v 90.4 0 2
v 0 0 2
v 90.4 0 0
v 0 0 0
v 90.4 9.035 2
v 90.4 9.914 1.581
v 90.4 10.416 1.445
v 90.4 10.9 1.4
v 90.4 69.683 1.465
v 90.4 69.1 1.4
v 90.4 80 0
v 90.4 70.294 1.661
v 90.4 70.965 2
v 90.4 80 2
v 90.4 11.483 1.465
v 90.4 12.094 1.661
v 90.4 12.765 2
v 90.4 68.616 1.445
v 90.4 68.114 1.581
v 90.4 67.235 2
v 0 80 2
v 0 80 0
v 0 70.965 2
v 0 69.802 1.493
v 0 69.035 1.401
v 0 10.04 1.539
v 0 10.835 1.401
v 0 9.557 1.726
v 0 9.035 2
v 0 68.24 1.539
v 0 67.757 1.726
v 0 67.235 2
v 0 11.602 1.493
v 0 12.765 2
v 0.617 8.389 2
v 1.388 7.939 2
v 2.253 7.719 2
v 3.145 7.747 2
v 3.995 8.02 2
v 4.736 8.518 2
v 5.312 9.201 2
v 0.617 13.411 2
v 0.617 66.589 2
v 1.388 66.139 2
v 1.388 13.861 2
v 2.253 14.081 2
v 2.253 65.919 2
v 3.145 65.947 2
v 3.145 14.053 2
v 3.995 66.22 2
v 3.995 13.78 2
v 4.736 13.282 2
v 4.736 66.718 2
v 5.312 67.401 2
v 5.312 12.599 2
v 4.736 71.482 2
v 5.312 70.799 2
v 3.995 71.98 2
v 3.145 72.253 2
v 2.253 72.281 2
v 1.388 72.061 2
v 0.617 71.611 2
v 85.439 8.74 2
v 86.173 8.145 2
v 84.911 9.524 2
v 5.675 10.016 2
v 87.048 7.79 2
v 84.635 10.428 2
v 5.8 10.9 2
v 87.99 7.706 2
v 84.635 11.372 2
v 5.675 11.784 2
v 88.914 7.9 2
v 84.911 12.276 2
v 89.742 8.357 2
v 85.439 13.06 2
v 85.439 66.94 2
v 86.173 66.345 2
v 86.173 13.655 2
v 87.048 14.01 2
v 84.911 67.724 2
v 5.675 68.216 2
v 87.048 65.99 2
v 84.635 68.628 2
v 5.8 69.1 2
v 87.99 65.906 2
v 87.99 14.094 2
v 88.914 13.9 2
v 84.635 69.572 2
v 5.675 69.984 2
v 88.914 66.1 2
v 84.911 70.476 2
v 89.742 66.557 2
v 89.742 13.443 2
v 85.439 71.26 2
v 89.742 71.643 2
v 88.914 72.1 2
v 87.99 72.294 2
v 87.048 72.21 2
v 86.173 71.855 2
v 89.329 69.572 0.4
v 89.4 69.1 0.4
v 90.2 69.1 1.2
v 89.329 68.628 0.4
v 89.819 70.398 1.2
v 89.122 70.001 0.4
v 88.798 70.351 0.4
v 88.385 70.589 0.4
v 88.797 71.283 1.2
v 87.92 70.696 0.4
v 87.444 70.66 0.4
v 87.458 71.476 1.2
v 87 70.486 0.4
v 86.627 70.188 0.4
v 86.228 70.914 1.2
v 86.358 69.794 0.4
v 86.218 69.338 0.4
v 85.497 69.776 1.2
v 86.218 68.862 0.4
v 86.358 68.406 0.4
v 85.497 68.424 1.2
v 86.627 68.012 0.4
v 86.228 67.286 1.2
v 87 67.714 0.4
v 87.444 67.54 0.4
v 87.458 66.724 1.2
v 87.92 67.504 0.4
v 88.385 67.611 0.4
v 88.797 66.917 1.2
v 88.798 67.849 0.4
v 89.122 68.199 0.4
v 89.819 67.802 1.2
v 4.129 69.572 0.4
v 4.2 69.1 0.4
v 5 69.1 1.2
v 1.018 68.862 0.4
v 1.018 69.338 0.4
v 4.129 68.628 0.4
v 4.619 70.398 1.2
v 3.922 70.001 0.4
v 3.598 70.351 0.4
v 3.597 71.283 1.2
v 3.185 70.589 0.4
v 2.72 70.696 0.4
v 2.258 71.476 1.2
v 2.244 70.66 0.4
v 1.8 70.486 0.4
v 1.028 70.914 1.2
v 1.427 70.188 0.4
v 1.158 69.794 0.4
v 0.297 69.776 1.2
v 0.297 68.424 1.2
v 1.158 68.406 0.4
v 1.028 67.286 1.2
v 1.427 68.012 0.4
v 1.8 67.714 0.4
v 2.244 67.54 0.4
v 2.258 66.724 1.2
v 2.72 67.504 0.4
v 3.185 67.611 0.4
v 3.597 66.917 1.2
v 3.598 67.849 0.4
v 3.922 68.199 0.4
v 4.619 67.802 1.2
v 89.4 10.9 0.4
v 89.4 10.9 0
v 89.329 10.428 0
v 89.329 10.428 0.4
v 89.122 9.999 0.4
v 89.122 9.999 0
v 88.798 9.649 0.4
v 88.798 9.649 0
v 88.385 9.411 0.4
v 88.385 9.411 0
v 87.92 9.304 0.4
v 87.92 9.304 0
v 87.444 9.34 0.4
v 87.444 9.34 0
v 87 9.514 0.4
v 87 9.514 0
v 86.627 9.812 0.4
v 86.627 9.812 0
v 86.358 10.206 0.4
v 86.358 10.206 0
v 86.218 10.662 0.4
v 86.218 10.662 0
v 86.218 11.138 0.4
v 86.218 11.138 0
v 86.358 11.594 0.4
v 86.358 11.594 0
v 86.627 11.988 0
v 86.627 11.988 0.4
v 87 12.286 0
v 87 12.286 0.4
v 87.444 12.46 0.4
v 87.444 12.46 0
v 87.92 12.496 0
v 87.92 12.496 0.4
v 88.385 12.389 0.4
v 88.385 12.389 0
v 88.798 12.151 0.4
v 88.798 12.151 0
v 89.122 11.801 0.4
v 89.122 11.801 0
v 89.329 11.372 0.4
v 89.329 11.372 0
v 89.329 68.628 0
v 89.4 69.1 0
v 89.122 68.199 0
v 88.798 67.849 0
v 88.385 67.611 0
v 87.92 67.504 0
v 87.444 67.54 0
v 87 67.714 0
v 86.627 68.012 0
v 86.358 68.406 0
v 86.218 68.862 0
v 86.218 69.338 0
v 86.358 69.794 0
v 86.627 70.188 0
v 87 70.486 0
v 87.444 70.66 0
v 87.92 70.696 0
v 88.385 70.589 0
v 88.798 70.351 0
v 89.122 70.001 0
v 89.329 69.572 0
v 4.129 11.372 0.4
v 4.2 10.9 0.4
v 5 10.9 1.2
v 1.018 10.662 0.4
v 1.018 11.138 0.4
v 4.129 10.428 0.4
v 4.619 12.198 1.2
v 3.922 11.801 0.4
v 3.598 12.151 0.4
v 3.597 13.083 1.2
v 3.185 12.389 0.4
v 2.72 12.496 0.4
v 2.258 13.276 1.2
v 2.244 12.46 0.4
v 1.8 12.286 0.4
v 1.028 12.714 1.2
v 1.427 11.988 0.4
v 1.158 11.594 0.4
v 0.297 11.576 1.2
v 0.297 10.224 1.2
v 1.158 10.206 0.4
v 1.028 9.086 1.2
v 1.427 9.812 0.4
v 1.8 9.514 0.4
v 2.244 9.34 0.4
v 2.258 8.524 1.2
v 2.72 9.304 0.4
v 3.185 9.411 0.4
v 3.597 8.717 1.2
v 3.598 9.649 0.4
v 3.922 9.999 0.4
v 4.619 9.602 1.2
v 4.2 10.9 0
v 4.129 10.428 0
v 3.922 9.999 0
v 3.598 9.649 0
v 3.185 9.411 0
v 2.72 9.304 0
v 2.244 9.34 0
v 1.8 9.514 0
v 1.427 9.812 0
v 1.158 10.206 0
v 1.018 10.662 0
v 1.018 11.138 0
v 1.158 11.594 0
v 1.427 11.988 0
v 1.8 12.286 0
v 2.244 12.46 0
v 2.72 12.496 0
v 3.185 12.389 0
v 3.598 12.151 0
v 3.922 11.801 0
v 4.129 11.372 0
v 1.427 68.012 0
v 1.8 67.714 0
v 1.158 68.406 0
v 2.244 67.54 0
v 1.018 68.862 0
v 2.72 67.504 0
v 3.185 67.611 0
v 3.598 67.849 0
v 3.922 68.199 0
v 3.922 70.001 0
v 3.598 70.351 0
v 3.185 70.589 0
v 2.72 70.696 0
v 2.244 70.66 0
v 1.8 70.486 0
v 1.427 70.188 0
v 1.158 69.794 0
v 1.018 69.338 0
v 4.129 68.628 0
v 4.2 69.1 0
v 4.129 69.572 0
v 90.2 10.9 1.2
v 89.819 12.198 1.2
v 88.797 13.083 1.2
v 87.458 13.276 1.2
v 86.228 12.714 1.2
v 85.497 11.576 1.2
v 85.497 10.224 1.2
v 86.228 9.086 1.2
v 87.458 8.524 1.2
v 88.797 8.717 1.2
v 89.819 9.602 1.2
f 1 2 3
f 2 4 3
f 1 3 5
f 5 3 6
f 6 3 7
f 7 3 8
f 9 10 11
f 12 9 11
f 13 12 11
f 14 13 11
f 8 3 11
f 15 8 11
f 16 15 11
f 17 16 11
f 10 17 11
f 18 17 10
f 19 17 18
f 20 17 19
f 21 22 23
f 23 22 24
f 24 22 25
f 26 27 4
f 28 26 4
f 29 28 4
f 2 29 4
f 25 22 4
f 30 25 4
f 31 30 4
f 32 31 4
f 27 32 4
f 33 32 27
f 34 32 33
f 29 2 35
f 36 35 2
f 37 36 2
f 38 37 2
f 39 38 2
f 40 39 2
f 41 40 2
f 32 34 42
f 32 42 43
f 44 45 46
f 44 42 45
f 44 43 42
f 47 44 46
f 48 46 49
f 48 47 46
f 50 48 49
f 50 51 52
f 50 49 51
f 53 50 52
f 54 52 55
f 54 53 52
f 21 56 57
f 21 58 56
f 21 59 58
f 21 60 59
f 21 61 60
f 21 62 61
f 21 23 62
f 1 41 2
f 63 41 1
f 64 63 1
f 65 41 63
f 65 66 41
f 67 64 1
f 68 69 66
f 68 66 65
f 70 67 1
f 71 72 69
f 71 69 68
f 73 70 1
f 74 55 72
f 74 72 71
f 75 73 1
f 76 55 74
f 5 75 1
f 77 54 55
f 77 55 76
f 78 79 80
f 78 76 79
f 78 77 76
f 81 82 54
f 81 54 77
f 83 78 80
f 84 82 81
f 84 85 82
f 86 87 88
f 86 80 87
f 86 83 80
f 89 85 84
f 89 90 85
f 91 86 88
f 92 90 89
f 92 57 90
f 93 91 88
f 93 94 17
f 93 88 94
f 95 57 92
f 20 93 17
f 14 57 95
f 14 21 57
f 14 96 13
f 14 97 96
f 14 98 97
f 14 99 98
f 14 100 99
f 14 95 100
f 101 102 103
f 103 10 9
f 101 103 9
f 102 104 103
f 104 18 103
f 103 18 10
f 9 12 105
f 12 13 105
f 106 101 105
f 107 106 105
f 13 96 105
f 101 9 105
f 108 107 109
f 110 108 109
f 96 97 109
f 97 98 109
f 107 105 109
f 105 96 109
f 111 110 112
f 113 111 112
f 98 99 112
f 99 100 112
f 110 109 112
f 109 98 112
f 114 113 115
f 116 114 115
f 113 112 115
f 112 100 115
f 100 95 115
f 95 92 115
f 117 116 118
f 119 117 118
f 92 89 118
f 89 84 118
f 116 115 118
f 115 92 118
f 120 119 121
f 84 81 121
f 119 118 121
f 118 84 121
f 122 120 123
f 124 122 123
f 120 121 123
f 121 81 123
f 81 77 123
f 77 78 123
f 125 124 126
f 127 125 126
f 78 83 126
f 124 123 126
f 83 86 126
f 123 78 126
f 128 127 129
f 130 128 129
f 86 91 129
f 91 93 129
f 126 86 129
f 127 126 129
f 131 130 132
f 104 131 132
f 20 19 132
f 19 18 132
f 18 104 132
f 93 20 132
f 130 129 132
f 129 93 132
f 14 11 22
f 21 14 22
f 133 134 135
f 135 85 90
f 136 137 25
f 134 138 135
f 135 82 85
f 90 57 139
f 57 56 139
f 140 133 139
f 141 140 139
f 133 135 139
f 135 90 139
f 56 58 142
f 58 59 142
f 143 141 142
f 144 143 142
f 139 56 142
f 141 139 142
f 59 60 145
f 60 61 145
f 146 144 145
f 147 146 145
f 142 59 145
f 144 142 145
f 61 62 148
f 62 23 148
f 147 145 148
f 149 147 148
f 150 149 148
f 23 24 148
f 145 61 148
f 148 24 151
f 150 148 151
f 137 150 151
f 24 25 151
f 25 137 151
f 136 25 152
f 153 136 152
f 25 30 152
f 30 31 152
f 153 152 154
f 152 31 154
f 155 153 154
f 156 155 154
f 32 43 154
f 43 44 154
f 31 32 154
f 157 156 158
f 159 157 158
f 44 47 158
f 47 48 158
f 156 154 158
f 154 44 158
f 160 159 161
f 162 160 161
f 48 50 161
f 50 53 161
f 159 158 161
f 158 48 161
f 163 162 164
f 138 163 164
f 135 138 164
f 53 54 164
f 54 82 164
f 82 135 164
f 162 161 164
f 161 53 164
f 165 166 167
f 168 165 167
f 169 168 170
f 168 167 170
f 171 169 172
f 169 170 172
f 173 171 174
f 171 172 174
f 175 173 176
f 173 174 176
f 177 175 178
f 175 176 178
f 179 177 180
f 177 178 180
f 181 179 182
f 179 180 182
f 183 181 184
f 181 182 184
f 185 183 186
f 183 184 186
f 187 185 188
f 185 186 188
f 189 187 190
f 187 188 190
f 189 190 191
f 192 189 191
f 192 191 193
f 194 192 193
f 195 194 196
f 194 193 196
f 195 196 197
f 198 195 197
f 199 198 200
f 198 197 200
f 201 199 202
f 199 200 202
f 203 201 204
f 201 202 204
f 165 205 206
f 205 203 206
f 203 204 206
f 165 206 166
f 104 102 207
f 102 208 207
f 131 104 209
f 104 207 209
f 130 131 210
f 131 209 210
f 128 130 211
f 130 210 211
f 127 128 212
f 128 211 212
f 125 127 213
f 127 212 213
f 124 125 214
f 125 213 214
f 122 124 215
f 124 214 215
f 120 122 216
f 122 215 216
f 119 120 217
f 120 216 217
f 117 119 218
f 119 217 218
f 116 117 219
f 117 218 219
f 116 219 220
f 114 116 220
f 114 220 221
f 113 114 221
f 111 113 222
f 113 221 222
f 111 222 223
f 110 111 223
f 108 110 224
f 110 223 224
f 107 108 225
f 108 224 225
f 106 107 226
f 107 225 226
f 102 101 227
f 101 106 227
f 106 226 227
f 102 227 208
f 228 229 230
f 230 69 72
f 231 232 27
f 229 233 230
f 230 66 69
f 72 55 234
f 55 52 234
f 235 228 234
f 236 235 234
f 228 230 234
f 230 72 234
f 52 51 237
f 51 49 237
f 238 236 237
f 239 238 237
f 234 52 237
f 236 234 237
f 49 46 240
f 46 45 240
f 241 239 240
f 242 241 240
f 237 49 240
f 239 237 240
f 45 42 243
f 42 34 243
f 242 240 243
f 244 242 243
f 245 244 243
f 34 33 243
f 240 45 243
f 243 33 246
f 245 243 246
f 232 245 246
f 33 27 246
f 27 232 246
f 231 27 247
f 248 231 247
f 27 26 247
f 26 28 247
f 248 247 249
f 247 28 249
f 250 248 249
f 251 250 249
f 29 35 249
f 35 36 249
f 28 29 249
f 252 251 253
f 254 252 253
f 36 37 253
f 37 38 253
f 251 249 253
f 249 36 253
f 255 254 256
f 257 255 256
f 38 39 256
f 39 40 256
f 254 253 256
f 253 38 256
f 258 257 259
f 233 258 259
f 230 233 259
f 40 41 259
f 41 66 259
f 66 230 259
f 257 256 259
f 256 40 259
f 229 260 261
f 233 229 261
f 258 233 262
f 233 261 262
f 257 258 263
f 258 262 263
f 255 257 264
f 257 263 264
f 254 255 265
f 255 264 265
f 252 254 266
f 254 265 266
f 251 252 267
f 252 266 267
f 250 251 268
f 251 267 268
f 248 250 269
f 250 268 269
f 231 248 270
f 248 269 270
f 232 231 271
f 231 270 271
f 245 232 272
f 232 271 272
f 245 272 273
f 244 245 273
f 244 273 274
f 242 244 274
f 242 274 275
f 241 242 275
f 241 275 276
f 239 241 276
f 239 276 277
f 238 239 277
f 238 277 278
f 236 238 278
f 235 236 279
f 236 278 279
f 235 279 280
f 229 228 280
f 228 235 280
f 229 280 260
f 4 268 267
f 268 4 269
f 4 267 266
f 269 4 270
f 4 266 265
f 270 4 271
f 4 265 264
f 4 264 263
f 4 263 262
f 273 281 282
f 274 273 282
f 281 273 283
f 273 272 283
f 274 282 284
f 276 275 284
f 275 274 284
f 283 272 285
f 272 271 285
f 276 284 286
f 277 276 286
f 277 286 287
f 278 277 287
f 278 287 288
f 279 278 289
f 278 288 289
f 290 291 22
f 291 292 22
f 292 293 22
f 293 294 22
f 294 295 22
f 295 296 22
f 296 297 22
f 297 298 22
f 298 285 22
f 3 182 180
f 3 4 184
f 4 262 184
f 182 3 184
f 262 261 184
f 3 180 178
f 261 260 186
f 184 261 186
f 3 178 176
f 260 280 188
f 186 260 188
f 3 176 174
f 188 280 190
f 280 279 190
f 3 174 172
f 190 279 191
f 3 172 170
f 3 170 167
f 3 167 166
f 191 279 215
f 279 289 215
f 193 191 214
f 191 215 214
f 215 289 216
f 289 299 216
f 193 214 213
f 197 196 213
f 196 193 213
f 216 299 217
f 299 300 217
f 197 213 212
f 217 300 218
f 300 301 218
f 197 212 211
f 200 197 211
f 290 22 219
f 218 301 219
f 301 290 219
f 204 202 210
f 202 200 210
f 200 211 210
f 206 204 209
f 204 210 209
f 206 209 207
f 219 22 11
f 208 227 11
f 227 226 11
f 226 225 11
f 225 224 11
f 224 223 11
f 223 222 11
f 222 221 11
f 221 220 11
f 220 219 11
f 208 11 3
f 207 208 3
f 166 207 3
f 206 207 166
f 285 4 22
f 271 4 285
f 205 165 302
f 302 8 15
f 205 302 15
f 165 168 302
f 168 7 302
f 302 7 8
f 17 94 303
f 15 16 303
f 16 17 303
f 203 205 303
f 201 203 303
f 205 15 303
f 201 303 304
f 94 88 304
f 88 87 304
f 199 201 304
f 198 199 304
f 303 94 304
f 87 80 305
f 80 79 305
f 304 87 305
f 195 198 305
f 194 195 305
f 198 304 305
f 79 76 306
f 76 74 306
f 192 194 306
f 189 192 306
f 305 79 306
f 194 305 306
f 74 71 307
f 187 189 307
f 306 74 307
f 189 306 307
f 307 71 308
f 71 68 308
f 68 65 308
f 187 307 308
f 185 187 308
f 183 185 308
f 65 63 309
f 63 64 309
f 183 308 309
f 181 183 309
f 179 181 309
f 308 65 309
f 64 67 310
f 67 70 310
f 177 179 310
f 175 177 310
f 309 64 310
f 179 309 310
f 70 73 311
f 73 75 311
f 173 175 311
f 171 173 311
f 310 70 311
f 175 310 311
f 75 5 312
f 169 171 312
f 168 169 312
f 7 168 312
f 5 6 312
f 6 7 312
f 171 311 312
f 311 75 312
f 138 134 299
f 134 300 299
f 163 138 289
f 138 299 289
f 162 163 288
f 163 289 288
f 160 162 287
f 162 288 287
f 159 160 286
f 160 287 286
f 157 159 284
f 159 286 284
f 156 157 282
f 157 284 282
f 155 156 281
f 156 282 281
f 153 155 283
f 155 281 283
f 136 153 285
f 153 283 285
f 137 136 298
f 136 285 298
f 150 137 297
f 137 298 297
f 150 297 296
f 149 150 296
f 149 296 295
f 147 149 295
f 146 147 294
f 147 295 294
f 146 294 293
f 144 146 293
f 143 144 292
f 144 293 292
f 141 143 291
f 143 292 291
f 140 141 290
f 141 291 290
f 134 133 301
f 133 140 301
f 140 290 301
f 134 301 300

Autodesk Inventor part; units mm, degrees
ref_plane "YZ Plane" through (0, 0, 0) normal (1, 0, 0) x (0, 1, 0)
ref_plane "XZ Plane" through (0, 0, 0) normal (0, 1, 0) x (-1, 0, 0)
ref_plane "XY Plane" through (0, 0, 0) normal (0, 0, 1) x (1, 0, 0)
sketch "Skizze1" plane through (0, 0, 0) normal (0, 0, 1) x (1, 0, 0)
  line L0 (0, 0) -> (90.4, 0)
  line L1 (90.4, 0) -> (90.4, 80)
  line L2 (90.4, 80) -> (0, 80)
  line L3 (0, 80) -> (0, 0)
  line L4 (2.6, 69.1) -> (87.8, 69.1) construction
  line L5 (87.8, 69.1) -> (87.8, 10.9) construction
  circle A0 centre (2.6, 69.1) radius 1.6
  circle A1 centre (2.6, 10.9) radius 1.6
  circle A2 centre (87.8, 69.1) radius 1.6
  circle A3 centre (87.8, 10.9) radius 1.6
  line L6 (65.2, 69.1) -> (82.75, 69.1) construction
  line L7 (25.2, 69.1) -> (42.75, 69.1) construction
  dimension "d0" = 90.4
  dimension "d1" = 80
  dimension "d5" = 87.8
  dimension "d6" = 3.2
extrude "Extrusion1" add sketch "Skizze1" along normal blind 2
chamfer "Fase1" distance 1.6 angle 45 4 edges at (86.2, 10.9, 2) (1, 10.9, 2) (1, 69.1, 2) (86.2, 69.1, 2)
properties part number "blech_2mm"
